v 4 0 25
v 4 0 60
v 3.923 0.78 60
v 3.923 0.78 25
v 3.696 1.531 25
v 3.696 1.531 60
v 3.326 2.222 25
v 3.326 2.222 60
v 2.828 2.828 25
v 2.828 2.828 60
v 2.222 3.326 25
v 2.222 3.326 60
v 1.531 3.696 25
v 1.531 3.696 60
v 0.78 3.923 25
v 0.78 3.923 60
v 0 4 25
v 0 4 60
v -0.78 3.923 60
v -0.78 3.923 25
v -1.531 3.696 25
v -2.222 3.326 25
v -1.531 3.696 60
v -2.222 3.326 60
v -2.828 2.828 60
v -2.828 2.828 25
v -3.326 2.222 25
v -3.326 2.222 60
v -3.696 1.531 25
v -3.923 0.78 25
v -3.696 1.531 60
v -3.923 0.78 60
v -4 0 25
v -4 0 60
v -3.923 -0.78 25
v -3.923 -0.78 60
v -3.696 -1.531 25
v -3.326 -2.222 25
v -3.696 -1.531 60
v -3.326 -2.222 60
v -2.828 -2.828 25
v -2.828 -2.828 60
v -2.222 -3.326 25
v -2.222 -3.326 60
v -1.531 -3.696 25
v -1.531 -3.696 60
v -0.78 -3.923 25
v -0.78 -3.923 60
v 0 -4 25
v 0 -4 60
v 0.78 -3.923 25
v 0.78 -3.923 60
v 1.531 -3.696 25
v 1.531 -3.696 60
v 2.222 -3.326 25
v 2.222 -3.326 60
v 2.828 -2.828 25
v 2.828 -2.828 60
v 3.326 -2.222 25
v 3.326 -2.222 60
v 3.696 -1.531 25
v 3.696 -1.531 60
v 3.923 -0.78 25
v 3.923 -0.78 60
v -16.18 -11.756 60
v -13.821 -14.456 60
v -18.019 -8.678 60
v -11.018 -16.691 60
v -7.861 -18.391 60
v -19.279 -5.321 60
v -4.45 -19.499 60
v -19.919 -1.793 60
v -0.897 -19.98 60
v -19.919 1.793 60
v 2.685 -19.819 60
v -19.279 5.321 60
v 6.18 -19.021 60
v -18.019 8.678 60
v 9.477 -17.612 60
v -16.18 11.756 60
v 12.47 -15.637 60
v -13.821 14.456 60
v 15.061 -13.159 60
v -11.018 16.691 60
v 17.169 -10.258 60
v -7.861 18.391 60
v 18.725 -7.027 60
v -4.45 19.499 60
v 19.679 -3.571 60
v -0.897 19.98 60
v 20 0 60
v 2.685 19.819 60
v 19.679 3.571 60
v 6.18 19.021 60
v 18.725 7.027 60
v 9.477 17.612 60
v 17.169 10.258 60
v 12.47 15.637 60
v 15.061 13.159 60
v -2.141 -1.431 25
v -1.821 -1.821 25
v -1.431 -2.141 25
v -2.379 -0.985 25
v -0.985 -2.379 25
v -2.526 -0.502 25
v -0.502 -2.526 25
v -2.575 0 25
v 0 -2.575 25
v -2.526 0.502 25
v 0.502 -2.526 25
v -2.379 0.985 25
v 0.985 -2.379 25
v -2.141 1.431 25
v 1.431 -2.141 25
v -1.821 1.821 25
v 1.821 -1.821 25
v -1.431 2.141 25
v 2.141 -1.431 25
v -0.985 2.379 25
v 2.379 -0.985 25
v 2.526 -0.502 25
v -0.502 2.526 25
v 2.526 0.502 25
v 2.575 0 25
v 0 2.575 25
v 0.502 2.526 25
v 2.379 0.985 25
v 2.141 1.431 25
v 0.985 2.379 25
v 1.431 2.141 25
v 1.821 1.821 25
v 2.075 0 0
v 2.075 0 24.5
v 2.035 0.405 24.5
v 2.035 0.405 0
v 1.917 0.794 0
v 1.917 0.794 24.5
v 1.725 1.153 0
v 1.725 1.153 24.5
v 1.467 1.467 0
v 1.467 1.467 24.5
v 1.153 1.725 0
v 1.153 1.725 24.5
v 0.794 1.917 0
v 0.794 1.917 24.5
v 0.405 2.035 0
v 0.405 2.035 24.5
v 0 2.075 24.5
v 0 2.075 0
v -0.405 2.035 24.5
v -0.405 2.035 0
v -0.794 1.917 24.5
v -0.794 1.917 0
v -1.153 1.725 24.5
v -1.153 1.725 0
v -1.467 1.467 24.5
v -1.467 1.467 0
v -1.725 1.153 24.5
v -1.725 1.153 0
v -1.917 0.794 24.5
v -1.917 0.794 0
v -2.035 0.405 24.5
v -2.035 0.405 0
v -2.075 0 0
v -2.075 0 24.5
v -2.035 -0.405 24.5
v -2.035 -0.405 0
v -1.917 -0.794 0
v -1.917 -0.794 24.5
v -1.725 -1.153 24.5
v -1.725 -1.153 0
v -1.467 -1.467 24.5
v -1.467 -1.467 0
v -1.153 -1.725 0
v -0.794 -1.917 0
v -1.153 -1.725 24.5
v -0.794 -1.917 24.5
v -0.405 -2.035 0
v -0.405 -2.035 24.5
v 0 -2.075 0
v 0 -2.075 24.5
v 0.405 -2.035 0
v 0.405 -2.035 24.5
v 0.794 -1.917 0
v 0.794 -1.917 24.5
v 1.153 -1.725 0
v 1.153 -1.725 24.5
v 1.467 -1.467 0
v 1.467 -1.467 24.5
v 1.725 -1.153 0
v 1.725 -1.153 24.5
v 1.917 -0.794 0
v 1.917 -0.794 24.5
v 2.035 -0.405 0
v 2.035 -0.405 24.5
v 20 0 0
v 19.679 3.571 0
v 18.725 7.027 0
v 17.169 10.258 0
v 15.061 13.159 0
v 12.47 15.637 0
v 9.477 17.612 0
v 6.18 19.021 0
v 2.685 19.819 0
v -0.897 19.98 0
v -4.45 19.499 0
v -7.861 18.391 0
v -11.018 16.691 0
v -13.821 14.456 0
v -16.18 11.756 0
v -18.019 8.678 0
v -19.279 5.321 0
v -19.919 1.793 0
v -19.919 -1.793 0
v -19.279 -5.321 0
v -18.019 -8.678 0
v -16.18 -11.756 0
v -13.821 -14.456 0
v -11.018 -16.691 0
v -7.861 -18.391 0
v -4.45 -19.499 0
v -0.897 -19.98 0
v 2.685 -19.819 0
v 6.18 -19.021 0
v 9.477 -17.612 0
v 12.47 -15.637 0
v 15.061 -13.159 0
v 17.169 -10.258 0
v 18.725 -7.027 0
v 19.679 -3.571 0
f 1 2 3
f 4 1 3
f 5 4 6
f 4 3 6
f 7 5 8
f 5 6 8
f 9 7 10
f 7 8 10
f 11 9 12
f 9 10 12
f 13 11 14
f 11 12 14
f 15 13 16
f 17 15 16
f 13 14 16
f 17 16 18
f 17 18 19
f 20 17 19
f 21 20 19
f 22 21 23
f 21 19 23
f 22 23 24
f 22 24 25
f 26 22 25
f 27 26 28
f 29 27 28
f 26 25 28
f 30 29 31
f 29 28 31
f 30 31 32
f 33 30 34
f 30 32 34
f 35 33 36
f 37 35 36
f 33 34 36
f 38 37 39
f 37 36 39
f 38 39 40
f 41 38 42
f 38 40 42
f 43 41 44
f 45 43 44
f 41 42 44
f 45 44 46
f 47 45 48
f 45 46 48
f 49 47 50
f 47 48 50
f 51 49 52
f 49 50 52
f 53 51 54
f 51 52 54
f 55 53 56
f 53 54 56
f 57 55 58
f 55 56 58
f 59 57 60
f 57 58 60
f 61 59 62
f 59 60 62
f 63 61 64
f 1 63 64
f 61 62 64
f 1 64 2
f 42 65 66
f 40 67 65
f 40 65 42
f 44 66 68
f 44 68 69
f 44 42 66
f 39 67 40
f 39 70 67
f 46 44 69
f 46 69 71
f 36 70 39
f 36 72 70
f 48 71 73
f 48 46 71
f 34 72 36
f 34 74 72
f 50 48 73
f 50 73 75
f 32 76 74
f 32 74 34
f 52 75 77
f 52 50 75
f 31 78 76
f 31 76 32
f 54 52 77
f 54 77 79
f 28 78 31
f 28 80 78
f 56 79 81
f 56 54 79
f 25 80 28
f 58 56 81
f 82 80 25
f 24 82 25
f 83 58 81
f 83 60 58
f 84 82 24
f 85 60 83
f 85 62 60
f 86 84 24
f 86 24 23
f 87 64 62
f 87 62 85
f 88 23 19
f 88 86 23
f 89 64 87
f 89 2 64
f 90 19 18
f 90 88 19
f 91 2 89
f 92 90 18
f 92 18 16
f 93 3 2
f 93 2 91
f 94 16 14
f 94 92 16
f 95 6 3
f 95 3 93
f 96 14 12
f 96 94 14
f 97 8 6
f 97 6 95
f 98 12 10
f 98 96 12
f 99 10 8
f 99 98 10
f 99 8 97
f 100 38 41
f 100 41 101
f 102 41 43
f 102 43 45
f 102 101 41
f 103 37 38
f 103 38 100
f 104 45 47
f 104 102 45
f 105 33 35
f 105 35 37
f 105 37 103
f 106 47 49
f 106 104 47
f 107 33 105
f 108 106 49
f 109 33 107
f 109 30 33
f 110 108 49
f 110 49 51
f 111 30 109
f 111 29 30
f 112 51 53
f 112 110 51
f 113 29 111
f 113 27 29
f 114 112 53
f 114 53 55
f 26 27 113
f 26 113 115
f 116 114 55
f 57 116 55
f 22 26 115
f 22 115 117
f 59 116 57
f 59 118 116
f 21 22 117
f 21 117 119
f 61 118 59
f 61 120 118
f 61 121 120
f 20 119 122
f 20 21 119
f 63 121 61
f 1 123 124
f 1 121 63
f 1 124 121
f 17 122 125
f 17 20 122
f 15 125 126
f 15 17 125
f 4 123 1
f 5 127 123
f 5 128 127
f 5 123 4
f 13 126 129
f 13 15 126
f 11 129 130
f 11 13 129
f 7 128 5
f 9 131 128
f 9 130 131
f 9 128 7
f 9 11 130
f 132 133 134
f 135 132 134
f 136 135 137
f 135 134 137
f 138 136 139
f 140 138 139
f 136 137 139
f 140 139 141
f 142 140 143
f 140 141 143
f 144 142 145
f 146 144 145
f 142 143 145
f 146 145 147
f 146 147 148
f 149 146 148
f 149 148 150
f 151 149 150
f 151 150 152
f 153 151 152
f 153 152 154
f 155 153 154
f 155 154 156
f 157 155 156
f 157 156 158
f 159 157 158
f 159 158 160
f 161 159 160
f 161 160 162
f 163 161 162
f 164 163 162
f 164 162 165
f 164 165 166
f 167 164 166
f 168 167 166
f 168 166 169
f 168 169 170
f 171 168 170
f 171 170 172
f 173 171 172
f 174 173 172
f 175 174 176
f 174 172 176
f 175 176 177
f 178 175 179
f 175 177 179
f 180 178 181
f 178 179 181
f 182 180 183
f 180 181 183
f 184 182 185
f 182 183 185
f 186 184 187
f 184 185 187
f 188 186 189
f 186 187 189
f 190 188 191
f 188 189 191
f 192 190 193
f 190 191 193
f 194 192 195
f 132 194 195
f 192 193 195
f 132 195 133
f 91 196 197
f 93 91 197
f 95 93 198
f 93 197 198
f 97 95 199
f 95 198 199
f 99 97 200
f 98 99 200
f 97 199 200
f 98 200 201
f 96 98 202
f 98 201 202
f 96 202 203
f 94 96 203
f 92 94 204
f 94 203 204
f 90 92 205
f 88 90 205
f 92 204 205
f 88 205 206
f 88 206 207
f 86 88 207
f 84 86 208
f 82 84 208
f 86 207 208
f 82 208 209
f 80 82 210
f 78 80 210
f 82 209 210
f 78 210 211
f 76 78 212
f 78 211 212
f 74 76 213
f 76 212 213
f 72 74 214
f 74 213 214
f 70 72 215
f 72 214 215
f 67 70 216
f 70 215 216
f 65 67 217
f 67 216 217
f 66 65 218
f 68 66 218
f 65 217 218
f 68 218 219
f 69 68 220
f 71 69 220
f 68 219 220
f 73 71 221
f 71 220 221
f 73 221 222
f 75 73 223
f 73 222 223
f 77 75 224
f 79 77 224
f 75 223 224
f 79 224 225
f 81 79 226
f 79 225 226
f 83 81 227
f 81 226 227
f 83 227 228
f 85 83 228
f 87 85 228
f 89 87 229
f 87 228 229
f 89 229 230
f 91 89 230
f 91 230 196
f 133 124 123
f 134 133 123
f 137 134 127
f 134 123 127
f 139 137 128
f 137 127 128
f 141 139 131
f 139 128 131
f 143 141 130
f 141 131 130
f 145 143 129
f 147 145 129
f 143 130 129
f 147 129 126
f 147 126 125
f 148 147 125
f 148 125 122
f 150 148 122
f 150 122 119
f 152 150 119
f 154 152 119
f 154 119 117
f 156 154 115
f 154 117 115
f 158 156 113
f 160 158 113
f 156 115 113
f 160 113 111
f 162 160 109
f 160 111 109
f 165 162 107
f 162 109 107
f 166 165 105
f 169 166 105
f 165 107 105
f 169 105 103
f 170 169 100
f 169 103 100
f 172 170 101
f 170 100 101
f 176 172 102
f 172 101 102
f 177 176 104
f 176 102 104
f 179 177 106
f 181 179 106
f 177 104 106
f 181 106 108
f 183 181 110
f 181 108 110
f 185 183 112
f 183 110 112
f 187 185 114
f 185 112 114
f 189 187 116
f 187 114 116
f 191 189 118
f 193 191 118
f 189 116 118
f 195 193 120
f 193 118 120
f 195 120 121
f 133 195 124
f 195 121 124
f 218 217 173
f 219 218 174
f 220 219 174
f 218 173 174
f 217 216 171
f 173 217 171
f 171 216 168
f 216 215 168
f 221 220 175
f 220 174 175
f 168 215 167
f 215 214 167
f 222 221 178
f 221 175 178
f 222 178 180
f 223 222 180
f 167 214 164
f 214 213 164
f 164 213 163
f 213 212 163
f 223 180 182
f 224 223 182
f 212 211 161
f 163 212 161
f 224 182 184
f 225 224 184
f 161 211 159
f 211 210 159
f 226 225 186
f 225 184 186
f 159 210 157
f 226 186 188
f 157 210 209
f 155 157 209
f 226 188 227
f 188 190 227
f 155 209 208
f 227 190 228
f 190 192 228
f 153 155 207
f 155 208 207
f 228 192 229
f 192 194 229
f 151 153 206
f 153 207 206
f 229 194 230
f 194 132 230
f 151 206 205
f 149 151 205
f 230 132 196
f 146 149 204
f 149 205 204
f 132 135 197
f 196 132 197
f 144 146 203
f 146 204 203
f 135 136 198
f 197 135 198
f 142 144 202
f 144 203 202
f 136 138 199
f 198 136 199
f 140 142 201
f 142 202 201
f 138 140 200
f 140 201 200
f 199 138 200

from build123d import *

# Parameters (mm, degrees)
SKICA1_R                 = 20
P_IDAT_VYSUNUT_M1_DEPTH  = 60
SKICA2_R                 = 2.075
ODEBRAT_VYSUNUT_M1_DEPTH = 60
SKICA3_R                 = 4
ODEBRAT_VYSUNUT_M2_DEPTH = 35
ZKOSEN_1_SIZE            = 0.5


with BuildPart() as part:
    # Skica1 → Přidat vysunutím1 (new body)
    with BuildSketch(Plane.XY):
        Circle(SKICA1_R)
    extrude(amount=P_IDAT_VYSUNUT_M1_DEPTH)

    # Skica2 → Odebrat vysunutím1 (cut)
    with BuildSketch(Plane.XY.offset(60)):
        Circle(SKICA2_R)
    extrude(amount=-ODEBRAT_VYSUNUT_M1_DEPTH, mode=Mode.SUBTRACT)

    # Skica3 → Odebrat vysunutím2 (cut)
    with BuildSketch(Plane.XY.offset(60)):
        Circle(SKICA3_R)
    extrude(amount=-ODEBRAT_VYSUNUT_M2_DEPTH, mode=Mode.SUBTRACT)

    # Zkosení1
    zkosen_1_edges = [part.edges().sort_by_distance(p)[0] for p in [
        (-2.075, 0, 25),
    ]]
    chamfer(zkosen_1_edges, length=ZKOSEN_1_SIZE)


solid = part.part
